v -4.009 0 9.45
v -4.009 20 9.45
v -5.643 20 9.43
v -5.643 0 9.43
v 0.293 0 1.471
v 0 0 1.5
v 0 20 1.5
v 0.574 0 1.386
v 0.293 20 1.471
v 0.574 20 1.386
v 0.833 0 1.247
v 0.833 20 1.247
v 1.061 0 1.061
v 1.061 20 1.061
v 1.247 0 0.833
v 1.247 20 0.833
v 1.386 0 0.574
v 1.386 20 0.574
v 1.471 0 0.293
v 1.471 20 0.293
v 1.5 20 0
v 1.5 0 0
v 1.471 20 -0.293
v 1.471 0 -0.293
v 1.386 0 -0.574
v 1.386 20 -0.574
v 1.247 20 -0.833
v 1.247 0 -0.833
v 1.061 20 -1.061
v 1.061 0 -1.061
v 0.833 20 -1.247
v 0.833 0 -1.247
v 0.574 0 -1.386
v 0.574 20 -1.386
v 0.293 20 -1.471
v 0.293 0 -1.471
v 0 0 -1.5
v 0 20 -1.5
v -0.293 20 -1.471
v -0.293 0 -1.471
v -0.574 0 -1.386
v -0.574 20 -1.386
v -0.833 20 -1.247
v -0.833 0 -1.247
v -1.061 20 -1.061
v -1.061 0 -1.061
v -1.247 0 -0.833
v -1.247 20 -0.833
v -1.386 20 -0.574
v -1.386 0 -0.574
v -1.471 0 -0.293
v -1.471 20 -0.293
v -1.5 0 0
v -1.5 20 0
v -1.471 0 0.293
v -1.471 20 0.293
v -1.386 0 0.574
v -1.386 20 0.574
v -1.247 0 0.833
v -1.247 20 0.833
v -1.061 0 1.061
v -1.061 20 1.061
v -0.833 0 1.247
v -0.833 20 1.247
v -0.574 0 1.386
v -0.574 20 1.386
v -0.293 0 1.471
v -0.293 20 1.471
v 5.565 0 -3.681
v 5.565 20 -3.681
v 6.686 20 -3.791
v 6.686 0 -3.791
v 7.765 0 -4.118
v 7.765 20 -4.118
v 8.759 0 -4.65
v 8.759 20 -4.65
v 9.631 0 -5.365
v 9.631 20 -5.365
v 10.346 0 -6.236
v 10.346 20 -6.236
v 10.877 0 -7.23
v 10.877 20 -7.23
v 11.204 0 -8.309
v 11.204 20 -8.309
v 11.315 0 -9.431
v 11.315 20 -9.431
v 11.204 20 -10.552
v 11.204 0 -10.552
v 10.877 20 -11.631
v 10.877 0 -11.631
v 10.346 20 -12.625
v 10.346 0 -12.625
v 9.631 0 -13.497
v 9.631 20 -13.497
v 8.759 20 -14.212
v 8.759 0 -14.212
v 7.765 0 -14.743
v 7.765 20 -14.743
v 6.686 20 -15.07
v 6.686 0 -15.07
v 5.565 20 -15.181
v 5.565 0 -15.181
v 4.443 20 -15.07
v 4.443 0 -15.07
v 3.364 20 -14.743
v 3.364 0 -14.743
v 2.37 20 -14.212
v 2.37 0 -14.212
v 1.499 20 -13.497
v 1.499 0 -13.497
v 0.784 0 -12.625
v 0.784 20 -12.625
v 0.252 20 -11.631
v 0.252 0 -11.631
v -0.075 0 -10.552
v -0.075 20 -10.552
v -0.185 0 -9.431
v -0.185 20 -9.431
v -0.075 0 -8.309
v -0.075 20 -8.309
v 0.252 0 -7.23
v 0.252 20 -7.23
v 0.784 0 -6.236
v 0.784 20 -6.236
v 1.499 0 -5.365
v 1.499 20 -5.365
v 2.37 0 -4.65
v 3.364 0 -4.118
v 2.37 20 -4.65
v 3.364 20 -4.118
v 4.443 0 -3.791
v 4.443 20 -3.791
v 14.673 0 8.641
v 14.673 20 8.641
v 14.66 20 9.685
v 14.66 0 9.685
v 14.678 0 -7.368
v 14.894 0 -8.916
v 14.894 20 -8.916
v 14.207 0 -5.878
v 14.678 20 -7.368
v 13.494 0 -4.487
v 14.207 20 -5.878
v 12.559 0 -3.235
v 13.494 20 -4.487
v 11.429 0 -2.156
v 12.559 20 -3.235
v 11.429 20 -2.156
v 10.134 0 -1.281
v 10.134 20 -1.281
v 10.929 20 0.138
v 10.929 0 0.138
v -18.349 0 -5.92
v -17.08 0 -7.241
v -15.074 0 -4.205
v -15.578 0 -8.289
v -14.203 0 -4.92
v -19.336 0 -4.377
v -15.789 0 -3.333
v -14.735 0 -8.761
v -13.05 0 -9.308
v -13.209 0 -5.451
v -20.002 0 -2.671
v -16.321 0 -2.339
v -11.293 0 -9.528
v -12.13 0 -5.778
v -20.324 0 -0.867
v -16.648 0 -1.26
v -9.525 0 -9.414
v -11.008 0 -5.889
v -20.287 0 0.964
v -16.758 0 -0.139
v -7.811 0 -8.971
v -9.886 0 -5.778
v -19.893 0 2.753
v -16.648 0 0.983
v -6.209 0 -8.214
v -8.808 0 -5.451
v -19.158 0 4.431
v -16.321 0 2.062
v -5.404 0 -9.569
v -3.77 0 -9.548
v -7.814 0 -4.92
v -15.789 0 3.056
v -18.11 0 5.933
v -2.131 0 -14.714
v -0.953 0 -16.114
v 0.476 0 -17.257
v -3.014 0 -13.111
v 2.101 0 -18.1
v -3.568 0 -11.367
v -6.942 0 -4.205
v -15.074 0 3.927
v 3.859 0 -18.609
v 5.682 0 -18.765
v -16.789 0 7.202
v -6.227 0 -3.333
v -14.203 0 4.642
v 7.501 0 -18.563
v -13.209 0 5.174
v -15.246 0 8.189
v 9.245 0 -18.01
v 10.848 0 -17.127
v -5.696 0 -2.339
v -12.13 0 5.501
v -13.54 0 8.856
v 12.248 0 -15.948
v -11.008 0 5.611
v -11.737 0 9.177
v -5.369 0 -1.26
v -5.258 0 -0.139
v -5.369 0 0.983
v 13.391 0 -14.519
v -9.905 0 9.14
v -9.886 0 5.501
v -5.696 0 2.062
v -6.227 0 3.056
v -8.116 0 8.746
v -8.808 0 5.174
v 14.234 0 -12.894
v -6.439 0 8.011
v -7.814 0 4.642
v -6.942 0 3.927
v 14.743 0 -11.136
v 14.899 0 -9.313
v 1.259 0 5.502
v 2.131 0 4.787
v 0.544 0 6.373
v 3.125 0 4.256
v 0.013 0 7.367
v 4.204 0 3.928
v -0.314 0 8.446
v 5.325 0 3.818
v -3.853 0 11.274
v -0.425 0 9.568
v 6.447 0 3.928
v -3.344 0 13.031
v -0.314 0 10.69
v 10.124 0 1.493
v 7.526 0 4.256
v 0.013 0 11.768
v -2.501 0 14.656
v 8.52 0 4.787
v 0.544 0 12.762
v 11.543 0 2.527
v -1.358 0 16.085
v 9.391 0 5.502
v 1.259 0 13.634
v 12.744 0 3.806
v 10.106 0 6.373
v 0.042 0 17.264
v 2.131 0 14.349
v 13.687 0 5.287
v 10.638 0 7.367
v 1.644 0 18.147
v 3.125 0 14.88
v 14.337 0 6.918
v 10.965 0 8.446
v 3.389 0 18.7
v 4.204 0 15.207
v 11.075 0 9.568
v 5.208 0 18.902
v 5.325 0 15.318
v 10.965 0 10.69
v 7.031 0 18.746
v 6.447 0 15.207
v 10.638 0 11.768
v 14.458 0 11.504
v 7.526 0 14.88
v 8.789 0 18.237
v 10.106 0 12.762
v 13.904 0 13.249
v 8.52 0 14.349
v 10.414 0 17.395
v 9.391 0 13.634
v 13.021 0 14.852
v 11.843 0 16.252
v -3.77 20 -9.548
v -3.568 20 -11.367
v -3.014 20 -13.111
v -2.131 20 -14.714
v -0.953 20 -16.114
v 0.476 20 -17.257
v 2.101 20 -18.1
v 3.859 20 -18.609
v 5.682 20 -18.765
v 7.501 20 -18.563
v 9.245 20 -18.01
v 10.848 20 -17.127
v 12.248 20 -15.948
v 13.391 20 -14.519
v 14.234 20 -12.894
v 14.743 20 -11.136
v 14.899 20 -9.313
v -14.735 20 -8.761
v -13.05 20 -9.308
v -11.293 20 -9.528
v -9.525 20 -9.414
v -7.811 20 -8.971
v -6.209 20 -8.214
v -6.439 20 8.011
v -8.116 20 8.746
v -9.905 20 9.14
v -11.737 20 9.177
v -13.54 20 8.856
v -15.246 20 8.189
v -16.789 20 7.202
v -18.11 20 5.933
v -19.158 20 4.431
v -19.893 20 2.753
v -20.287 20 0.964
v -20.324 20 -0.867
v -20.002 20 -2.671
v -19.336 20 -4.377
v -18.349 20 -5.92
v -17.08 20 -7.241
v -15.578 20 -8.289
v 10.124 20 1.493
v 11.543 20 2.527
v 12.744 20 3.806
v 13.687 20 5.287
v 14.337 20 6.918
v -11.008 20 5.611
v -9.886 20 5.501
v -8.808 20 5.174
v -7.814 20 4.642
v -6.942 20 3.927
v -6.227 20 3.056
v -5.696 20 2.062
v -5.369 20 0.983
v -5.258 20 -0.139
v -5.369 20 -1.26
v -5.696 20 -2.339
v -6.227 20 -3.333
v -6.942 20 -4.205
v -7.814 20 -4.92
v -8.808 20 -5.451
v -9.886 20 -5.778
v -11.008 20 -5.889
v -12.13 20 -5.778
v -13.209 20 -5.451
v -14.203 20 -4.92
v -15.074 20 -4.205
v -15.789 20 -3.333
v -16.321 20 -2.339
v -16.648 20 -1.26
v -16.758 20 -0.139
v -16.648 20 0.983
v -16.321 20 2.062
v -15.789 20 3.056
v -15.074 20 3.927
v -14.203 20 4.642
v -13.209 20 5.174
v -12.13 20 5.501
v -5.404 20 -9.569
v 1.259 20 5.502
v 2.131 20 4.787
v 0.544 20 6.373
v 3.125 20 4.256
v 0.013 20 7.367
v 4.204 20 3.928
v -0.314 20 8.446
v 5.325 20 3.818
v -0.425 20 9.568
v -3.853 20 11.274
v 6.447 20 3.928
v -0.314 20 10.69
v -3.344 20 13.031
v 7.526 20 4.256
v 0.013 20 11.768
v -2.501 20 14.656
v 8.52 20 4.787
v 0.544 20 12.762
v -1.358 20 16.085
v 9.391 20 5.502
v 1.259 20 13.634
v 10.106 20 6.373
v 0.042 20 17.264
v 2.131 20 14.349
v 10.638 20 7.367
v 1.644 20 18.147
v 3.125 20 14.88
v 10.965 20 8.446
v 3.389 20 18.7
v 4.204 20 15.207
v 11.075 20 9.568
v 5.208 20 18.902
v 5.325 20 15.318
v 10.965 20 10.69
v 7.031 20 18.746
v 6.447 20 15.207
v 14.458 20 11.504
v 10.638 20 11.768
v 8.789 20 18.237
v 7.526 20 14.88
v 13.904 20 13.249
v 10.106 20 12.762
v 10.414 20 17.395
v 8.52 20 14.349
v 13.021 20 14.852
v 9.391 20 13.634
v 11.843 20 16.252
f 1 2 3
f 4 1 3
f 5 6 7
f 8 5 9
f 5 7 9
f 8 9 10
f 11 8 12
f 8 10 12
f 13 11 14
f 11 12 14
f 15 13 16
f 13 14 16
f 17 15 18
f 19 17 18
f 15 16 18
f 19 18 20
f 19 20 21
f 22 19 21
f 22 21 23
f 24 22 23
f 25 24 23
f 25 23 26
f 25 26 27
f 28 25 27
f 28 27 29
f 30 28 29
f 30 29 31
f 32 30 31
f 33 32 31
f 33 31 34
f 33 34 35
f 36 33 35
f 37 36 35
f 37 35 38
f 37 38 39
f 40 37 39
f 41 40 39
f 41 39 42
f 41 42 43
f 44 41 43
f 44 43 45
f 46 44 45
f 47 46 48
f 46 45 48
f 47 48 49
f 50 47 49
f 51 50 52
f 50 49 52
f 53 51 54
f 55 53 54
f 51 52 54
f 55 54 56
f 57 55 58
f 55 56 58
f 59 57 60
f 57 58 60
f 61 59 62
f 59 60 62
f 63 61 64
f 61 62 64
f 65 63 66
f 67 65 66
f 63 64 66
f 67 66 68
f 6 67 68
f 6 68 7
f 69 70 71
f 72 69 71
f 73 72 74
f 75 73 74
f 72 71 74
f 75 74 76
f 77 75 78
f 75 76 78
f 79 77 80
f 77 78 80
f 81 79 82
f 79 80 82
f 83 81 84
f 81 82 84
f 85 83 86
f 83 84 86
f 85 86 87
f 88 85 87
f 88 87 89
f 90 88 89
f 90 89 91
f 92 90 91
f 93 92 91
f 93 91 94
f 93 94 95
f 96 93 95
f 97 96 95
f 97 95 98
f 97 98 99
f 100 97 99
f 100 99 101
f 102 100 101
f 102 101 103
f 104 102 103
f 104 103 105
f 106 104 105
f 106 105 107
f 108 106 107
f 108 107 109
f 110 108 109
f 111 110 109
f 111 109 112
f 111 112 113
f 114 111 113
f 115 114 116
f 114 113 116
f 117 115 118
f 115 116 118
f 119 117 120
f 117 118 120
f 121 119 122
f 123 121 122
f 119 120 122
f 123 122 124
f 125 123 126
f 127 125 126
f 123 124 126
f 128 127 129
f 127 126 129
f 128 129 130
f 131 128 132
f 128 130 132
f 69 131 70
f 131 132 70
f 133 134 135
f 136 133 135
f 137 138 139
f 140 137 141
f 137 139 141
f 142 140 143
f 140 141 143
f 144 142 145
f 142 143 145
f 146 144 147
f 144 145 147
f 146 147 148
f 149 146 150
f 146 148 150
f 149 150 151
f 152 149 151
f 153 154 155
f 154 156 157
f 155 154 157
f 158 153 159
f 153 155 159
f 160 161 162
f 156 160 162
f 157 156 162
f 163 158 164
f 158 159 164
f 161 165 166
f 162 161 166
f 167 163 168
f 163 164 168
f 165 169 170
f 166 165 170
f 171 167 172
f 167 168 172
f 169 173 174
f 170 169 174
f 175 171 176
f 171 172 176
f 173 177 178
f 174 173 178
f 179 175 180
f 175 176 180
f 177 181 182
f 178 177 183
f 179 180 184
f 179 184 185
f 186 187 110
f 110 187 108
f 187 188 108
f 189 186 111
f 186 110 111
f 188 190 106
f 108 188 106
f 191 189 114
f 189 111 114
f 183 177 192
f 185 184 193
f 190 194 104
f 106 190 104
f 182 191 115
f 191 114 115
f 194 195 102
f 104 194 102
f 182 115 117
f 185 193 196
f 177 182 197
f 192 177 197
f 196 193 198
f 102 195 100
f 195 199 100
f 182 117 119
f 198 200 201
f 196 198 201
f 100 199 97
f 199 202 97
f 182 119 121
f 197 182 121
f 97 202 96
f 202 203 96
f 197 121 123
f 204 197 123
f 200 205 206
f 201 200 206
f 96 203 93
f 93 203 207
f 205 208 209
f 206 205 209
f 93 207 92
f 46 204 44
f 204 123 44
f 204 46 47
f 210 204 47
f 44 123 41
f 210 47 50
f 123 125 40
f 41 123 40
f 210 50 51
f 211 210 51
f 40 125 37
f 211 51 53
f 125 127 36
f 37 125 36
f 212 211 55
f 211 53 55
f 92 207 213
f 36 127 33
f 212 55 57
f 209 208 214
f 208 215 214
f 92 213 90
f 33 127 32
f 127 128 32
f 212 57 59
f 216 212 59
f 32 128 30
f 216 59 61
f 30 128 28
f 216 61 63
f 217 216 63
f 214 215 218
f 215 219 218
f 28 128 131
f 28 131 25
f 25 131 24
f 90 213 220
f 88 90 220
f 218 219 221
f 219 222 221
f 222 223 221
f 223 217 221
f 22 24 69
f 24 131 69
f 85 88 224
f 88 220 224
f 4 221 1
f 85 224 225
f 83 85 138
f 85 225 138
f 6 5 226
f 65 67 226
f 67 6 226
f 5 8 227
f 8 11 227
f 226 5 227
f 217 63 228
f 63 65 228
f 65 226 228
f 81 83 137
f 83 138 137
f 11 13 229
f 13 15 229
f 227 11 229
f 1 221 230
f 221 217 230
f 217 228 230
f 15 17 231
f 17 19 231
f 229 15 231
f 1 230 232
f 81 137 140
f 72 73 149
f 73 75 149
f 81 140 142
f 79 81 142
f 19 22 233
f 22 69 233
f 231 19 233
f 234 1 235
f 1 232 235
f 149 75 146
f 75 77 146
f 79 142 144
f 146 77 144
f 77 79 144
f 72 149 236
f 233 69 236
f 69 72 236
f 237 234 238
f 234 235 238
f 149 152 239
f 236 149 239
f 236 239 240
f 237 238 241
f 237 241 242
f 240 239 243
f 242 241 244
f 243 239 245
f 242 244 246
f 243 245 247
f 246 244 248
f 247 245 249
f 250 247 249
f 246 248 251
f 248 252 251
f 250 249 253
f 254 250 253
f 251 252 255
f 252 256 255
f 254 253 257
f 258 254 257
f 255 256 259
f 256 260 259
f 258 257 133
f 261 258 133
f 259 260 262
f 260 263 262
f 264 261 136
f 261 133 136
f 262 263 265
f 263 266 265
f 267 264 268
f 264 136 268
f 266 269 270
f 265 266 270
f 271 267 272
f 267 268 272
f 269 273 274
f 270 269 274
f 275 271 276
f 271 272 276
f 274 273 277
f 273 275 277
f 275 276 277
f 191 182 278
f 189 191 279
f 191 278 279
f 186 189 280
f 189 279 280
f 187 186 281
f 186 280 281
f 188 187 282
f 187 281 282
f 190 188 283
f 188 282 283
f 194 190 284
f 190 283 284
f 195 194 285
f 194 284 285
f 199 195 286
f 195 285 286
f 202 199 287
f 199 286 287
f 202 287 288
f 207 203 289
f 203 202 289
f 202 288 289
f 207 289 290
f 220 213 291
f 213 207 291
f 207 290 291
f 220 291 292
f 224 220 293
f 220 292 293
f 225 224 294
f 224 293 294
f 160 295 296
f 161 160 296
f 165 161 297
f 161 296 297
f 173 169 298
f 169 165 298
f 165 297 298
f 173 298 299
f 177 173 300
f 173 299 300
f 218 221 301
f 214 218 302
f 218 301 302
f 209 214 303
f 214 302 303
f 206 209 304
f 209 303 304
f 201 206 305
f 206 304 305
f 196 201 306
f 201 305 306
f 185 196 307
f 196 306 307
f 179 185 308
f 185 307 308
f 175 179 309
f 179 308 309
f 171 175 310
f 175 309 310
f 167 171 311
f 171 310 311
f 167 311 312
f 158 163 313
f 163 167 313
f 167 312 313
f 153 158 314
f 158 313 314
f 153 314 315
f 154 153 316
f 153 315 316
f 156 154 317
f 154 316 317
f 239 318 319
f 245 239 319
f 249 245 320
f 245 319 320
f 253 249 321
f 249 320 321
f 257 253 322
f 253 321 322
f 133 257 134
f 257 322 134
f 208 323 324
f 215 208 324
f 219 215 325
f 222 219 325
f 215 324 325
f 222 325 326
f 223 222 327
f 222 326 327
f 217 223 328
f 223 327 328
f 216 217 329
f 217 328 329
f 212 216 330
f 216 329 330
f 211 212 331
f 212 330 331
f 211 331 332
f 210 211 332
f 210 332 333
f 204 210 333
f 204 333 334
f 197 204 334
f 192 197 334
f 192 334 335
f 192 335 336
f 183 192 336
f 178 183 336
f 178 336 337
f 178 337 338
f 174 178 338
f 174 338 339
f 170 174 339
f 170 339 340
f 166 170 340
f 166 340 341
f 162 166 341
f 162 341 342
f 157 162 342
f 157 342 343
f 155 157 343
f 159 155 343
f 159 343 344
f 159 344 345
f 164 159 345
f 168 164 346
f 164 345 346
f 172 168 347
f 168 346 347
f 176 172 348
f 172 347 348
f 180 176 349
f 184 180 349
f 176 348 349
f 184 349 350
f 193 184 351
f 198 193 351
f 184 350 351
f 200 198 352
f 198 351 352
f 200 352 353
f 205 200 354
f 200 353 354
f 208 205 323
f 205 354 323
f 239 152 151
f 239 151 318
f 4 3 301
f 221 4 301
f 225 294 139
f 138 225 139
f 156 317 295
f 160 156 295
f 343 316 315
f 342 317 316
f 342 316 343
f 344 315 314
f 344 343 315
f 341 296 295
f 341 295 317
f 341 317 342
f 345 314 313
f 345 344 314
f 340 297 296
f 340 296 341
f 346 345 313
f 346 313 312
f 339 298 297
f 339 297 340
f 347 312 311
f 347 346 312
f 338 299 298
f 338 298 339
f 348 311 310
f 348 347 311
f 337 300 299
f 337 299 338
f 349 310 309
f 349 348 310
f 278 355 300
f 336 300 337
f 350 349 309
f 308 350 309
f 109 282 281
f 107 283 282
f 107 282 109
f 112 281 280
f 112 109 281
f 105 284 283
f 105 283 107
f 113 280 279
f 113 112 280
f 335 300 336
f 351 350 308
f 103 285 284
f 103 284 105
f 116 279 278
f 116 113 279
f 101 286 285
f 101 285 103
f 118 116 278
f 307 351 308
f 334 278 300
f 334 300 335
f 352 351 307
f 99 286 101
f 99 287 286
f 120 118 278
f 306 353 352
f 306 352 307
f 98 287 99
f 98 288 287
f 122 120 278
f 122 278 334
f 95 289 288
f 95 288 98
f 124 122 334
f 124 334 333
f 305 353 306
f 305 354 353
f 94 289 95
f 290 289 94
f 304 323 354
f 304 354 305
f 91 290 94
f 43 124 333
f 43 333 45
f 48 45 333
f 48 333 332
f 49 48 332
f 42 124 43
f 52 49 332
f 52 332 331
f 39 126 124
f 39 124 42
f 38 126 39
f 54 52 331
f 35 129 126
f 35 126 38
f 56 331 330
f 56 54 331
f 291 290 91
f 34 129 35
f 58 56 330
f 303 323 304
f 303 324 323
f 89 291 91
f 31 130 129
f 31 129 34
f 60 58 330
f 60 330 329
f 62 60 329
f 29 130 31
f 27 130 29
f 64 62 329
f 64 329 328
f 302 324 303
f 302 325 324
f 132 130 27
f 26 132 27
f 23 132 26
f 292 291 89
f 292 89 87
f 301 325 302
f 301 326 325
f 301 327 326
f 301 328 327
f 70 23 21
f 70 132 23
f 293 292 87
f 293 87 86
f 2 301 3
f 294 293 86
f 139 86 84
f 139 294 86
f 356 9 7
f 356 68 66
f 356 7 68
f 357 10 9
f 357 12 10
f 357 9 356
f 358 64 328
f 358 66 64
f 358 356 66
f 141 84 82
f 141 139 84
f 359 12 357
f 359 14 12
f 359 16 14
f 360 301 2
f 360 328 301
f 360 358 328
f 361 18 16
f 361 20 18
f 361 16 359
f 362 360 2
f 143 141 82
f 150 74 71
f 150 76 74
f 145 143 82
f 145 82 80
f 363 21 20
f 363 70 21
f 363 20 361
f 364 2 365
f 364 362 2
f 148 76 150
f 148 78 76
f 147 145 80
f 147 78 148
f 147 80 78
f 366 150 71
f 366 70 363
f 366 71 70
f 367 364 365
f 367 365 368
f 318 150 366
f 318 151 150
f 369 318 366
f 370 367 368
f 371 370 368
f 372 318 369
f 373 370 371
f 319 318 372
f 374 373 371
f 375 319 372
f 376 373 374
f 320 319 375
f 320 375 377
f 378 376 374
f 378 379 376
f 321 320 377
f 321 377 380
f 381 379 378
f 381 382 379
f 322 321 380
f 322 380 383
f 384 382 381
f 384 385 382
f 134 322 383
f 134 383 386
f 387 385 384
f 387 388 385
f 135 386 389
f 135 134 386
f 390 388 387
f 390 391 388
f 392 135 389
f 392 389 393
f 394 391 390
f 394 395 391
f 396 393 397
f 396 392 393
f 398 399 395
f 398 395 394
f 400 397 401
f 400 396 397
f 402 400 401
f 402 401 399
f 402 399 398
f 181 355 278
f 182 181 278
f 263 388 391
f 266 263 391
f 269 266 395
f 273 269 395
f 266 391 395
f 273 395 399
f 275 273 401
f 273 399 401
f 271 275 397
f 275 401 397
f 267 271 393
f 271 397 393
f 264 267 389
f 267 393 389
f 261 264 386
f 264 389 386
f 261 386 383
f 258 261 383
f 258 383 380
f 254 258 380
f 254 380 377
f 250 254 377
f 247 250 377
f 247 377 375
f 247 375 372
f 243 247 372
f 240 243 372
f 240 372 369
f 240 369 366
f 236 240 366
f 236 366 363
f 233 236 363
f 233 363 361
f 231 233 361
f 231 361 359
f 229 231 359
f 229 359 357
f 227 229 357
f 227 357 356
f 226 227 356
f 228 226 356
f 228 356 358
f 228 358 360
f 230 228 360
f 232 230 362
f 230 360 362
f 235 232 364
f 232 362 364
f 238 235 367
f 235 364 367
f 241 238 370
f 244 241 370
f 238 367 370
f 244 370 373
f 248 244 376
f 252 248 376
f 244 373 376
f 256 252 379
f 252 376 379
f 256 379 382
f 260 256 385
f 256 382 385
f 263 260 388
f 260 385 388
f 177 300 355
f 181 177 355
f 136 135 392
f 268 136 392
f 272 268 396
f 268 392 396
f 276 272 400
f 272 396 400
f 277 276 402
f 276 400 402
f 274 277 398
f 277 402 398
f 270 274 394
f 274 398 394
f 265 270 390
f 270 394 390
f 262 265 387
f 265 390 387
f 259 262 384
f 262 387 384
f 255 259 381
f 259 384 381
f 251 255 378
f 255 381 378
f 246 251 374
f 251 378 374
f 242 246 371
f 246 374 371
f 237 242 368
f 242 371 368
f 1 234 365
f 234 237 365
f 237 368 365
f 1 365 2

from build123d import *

# Parameters (mm, degrees)
SKETCH5_R               = 30
BOSS_EXTRUDE1_DEPTH     = 20
SKETCH6_R               = 5.75
CUT_EXTRUDE1_DEPTH      = 50
CUT_EXTRUDE_THIN1_DEPTH = 50
SKETCH11_R              = 1.5
CUT_EXTRUDE2_DEPTH      = 35.227641189


with BuildPart() as part:
    # Sketch5 → Boss-Extrude1 (new body)
    with BuildSketch(Plane(origin=(0, 0, 0), x_dir=(1, 0, 0), z_dir=(0, 1, 0))):
        with Locations(Location((0, 0, 0), (0, 0, 270))):
            Circle(SKETCH5_R)
    extrude(amount=BOSS_EXTRUDE1_DEPTH)

    # Sketch6 → Cut-Extrude1 (cut)
    with BuildSketch(Plane(origin=(0, 20, 0), x_dir=(1, 0, 0), z_dir=(0, 1, 0))):
        with Locations(Location((5.564652455, 9.430649132, 0), (0, 0, 270))):
            Circle(SKETCH6_R)
        with Locations(Location((5.325305202, -9.567843252, 0), (0, 0, 270))):
            Circle(SKETCH6_R)
        with Locations(Location((-11.00819821, 0.138683741, 0), (0, 0, 270))):
            Circle(SKETCH6_R)
    extrude(amount=-CUT_EXTRUDE1_DEPTH, mode=Mode.SUBTRACT)

    # Sketch9 → Cut-Extrude-Thin1 (cut)
    with BuildSketch(Plane(origin=(0, 20, 0), x_dir=(1, 0, 0), z_dir=(0, 1, 0))):
        with BuildLine():
            ThreePointArc((-3.76991423, 9.548248089), (5.682251411, 18.765215817), (14.899219139, 9.313050176))
            Line((14.899219139, 9.313050176), (14.659871887, -9.685442209))
            ThreePointArc((14.659871887, -9.685442209), (5.207706246, -18.902409937), (-4.009261482, -9.450244295))
            Line((-4.009261482, -9.450244295), (-14.008468, -9.324272058))
            ThreePointArc((-14.008468, -9.324272058), (5.081734008, -28.901616455), (24.659078405, -9.811414447))
            Line((24.659078405, -9.811414447), (24.898425657, 9.187077938))
            ThreePointArc((24.898425657, 9.187077938), (5.808223649, 28.764422335), (-13.769120748, 9.674220327))
            Line((-13.769120748, 9.674220327), (-3.76991423, 9.548248089))
        make_face()
        with BuildLine():
            ThreePointArc((10.124185438, -1.49260411), (13.400544345, -14.366723488), (0.526424967, -17.643082394))
            Line((0.526424967, -17.643082394), (-15.807078446, -7.936555401))
            ThreePointArc((-15.807078446, -7.936555401), (-19.083437352, 4.937563977), (-6.209317974, 8.213922883))
            Line((-6.209317974, 8.213922883), (-1.100619557, 16.810503626))
            ThreePointArc((-1.100619557, 16.810503626), (-27.680018096, 10.046262394), (-20.915776863, -16.533136145))
            Line((-20.915776863, -16.533136145), (-4.582273451, -26.239663138))
            ThreePointArc((-4.582273451, -26.239663138), (21.997125088, -19.475421905), (15.232883856, 7.103976633))
            Line((15.232883856, 7.103976633), (10.124185438, -1.49260411))
        make_face()
        with BuildLine():
            ThreePointArc((-6.438623457, -8.011462842), (-19.158344793, -4.430891012), (-15.577772963, 8.288830324))
            Line((-15.577772963, 8.288830324), (0.995077701, 17.580795716))
            ThreePointArc((0.995077701, 17.580795716), (13.714799038, 14.000223886), (10.134227208, 1.280502549))
            Line((10.134227208, 1.280502549), (15.024735309, -7.442050432))
            ThreePointArc((15.024735309, -7.442050432), (22.437352019, 18.890731987), (-3.8954304, 26.303348697))
            Line((-3.8954304, 26.303348697), (-20.468281064, 17.011383305))
            ThreePointArc((-20.468281064, 17.011383305), (-27.880897775, -9.321399113), (-1.548115356, -16.734015824))
            Line((-1.548115356, -16.734015824), (-6.438623457, -8.011462842))
        make_face()
    extrude(amount=-CUT_EXTRUDE_THIN1_DEPTH, mode=Mode.SUBTRACT)


with BuildPart() as cut_extrude_thin1_kept_piece:
    # of the separate pieces the step leaves, the one the design keeps (cut_extrude_thin1_pieces_kept)
    add(part.part.solids().sort_by_distance((-4.009261482, 0, 9.450244295))[0])

    # Sketch11 → Cut-Extrude2 (cut, through all)
    with BuildSketch(Plane(origin=(0, 20, 0), x_dir=(1, 0, 0), z_dir=(0, 1, 0))):
        with Locations(Location((0, 0, 0), (0, 0, 270))):
            Circle(SKETCH11_R)
    extrude(amount=-CUT_EXTRUDE2_DEPTH, mode=Mode.SUBTRACT)


solid = cut_extrude_thin1_kept_piece.part
